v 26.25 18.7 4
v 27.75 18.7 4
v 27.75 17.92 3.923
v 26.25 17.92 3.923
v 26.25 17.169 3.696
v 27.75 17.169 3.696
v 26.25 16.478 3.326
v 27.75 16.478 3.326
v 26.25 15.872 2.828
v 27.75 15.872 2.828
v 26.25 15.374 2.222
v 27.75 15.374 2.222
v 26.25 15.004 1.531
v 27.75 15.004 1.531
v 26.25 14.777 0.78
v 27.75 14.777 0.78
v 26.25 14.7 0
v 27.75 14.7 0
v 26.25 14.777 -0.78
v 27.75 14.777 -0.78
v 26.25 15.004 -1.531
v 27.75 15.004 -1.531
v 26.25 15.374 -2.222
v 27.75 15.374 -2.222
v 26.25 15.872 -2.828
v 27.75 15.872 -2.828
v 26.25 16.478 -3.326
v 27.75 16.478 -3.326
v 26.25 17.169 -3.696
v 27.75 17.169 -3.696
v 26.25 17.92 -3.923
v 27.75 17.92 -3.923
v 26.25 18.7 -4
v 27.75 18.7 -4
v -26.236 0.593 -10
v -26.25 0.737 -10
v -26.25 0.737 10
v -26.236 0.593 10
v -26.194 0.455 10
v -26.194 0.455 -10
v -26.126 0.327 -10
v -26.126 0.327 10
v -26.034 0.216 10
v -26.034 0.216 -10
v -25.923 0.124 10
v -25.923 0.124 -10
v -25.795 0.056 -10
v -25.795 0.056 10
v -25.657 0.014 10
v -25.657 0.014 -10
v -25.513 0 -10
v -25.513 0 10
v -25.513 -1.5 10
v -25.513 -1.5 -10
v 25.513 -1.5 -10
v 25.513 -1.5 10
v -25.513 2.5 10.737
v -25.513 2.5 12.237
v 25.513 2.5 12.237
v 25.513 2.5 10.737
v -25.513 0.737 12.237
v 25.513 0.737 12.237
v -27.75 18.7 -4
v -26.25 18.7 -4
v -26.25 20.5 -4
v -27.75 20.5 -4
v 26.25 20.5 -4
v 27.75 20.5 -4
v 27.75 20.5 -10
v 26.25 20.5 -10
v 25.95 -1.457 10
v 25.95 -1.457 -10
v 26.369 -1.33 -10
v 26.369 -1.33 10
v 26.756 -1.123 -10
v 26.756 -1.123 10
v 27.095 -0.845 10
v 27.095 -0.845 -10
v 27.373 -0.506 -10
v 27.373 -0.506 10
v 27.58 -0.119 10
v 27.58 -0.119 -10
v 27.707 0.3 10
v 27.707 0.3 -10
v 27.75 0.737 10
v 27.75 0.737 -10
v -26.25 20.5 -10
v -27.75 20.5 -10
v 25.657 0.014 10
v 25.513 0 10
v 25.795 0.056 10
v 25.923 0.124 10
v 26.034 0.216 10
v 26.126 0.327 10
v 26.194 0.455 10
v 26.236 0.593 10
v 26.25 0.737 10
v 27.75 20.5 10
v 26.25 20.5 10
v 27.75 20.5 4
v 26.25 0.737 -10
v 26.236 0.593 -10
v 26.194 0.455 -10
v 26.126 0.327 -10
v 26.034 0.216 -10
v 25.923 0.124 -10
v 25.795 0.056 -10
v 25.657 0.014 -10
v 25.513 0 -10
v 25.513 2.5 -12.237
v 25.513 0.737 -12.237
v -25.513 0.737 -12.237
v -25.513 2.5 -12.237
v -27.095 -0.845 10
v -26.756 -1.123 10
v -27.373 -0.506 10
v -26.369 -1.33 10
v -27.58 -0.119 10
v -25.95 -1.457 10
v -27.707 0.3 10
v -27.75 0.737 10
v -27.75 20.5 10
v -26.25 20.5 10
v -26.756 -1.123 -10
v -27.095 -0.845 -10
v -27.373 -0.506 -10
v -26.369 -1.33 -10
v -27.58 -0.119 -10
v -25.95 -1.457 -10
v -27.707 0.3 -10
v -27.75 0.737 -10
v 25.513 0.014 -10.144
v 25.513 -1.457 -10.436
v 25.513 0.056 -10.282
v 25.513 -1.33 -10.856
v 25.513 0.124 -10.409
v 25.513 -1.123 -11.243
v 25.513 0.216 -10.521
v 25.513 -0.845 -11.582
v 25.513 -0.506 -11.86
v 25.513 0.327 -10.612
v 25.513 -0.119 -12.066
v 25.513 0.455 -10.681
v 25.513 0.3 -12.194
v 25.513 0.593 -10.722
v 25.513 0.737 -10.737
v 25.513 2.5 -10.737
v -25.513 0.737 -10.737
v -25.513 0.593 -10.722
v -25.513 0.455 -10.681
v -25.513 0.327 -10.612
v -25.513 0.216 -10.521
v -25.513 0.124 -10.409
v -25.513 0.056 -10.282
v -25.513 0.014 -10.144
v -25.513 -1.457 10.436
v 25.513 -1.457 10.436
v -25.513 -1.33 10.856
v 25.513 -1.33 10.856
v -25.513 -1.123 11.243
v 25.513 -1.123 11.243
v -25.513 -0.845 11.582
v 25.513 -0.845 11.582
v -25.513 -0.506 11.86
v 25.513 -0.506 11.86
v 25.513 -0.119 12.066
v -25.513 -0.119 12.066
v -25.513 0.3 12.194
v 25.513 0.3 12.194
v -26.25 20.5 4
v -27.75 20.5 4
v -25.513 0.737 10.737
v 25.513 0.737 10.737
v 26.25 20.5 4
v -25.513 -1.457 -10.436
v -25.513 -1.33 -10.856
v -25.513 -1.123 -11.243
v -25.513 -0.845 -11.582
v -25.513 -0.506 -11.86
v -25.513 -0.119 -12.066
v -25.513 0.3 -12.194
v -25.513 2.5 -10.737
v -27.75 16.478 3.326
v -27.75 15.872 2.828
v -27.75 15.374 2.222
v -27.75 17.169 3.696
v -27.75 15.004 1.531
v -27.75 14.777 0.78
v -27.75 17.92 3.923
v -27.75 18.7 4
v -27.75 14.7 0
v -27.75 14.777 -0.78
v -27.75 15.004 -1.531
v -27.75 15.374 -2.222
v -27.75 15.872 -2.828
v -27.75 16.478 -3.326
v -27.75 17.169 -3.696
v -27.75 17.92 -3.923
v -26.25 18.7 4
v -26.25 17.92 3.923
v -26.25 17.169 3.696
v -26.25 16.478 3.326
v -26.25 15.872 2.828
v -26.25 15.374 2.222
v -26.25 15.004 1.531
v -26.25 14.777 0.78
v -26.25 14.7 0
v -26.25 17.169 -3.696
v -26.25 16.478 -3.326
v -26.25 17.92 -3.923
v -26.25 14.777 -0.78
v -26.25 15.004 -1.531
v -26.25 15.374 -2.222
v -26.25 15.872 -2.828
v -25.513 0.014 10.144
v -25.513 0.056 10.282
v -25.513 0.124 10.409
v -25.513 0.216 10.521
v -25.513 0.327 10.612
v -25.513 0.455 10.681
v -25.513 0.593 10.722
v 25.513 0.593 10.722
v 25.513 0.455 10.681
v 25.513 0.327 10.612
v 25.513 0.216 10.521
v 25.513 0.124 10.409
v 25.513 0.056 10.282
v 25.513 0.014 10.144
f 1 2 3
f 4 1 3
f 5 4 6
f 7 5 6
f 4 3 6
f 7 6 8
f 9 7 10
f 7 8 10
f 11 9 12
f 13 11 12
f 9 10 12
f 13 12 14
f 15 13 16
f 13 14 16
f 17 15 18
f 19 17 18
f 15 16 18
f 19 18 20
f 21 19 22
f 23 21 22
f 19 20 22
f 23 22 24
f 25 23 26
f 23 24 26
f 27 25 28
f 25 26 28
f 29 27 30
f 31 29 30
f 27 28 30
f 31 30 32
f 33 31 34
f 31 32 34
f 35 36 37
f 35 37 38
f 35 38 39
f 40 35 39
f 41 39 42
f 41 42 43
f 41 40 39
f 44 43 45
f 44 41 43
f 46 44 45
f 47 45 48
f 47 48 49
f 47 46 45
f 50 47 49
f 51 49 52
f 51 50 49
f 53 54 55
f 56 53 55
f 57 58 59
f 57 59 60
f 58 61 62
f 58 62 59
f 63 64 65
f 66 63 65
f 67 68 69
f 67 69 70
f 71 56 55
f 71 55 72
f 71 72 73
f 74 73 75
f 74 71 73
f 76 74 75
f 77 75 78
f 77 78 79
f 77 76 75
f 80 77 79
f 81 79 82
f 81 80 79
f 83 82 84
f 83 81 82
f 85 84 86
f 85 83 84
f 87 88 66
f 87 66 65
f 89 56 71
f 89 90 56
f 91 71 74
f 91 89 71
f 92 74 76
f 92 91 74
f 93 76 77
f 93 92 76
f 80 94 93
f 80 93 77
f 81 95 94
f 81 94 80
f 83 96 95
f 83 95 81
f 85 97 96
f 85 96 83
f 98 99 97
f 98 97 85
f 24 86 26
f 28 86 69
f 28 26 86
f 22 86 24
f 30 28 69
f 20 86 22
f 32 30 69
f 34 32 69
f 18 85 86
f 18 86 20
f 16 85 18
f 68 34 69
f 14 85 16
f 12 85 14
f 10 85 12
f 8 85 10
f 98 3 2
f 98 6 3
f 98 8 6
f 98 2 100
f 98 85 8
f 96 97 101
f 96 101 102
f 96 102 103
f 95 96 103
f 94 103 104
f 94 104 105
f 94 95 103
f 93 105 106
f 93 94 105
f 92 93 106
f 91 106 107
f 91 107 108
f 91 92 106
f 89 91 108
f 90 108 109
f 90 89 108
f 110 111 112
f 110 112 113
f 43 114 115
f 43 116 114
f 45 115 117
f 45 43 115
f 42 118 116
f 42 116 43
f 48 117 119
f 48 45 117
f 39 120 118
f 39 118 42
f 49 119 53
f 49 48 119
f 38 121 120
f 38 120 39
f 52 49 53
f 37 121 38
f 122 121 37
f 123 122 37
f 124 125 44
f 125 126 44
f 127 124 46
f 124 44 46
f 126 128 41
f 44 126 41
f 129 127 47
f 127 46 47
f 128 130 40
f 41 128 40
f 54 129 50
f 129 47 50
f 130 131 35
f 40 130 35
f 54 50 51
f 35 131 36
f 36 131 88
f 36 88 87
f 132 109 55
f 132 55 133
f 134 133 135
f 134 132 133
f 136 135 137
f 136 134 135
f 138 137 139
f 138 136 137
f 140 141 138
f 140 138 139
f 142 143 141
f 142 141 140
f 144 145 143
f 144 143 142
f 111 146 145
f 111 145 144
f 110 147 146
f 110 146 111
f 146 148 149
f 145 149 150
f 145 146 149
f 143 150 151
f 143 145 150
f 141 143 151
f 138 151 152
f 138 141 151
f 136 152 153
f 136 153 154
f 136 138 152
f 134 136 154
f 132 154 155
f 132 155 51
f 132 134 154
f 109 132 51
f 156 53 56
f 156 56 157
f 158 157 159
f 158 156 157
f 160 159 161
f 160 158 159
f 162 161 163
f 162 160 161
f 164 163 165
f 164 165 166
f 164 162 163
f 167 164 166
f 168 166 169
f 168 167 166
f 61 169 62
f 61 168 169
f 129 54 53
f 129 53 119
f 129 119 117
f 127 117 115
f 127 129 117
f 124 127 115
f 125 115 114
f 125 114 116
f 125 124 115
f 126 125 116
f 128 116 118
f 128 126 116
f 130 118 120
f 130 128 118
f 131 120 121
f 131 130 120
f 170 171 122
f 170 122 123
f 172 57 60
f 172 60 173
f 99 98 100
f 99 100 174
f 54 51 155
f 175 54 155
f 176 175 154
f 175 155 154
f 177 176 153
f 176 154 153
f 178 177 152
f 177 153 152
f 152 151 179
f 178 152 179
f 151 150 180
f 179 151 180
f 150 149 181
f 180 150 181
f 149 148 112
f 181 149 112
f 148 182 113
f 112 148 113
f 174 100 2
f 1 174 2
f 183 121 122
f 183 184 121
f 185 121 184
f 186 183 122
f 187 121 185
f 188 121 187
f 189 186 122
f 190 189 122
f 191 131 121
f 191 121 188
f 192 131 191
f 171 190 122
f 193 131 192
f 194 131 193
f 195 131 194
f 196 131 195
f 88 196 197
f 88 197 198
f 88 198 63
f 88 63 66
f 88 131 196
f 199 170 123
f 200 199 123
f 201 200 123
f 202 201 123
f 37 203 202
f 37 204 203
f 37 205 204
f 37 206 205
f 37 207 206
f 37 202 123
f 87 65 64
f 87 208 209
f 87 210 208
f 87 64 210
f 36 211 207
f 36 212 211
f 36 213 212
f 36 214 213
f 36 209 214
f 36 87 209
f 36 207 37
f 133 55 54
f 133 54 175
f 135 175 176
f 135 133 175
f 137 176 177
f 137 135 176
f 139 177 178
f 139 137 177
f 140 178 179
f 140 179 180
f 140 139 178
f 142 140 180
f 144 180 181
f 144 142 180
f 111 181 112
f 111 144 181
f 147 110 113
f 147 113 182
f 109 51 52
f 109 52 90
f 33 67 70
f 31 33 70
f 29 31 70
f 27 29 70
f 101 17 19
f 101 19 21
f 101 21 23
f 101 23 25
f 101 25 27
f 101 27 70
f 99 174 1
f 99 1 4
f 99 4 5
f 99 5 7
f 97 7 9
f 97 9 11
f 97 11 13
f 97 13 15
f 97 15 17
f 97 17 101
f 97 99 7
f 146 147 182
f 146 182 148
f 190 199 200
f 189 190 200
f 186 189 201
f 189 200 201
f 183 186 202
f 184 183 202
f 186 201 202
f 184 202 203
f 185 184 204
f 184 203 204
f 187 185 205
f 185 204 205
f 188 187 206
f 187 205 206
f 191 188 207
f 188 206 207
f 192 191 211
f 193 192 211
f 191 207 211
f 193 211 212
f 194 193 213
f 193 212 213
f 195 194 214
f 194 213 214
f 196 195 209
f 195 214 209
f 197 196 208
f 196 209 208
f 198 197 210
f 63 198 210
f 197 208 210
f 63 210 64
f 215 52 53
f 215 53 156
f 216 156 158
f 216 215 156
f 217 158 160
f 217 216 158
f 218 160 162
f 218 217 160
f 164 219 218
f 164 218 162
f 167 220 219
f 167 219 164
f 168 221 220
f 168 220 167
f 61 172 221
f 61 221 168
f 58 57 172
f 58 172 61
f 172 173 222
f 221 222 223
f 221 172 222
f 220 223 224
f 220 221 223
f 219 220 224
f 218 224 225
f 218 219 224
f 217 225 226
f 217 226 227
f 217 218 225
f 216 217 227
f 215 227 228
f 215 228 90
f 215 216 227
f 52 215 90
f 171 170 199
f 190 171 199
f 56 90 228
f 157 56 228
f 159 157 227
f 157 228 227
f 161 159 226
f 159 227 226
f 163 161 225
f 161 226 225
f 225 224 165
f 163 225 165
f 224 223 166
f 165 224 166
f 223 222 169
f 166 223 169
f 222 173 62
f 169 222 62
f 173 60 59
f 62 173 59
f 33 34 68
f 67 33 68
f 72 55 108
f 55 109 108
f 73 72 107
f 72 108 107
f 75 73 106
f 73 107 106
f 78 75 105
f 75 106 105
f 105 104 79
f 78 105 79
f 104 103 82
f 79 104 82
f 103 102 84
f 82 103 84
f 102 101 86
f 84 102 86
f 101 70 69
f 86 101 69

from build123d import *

# Parameters (mm, degrees)
CROQUIS3_W                         = 55.5
CROQUIS3_H                         = 20
BRIDA_BASE1_DEPTH                  = 1.5
BRIDA_DE_ARISTA1_STRIP_W           = 7.4732
BRIDA_DE_ARISTA1_STRIP_H           = 1.5
BRIDA_DE_ARISTA1_STRIP_CUT_DEPTH   = 20
BRIDA_DE_ARISTA1_STRIP_2_W         = 7.4732
BRIDA_DE_ARISTA1_STRIP_2_H         = 1.5
BRIDA_DE_ARISTA1_STRIP_CUT_2_DEPTH = 20
BRIDA_DE_ARISTA1_DEPTH             = 20
BRIDA_DE_ARISTA1_BEND_DEPTH        = 20
BRIDA_DE_ARISTA2_DEPTH             = 51.0268
BRIDA_DE_ARISTA2_BEND_DEPTH        = 51.0268
CORTAR_EXTRUIR1_REACH              = 62.417


# Sheet-metal steps are written as plain solids
with BuildPart() as part:
    # Croquis3 → Brida base1 (new body)
    with BuildSketch(Plane(origin=(0, 0, 0), x_dir=(1, 0, 0), z_dir=(0, 1, 0))):
        Rectangle(CROQUIS3_W, CROQUIS3_H)
    extrude(amount=-BRIDA_BASE1_DEPTH)

    # Brida de arista1 strip (across the edge) → Brida de arista1 strip cut (cut)
    with BuildSketch(Plane(origin=(-27.75, 0, -10), x_dir=(1, 0, 0), z_dir=(0, 0, 1))):
        with Locations((-1.5, -0.75)):
            Rectangle(BRIDA_DE_ARISTA1_STRIP_W, BRIDA_DE_ARISTA1_STRIP_H)
    extrude(amount=BRIDA_DE_ARISTA1_STRIP_CUT_DEPTH, mode=Mode.SUBTRACT)

    # Brida de arista1 strip 2 (across the edge) → Brida de arista1 strip cut 2 (cut)
    with BuildSketch(Plane(origin=(27.75, 0, 10), x_dir=(-1, 0, 0), z_dir=(0, 0, -1))):
        with Locations((-1.5, -0.75)):
            Rectangle(BRIDA_DE_ARISTA1_STRIP_2_W, BRIDA_DE_ARISTA1_STRIP_2_H)
    extrude(amount=BRIDA_DE_ARISTA1_STRIP_CUT_2_DEPTH, mode=Mode.SUBTRACT)

    # Brida de arista1 section (across the edge) → Brida de arista1 (add)
    with BuildSketch(Plane(origin=(-27.75, 0, -10), x_dir=(1, 0, 0), z_dir=(0, 0, 1))):
        with BuildLine():
            Line((0, 0.7366), (0, 20.5))
            Line((0, 20.5), (1.5, 20.5))
            Line((1.5, 20.5), (1.5, 0.7366))
            ThreePointArc((1.5, 0.7366), (1.715745145, 0.215745145), (2.2366, 0))
            Line((2.2366, 0), (2.2366, -1.5))
            ThreePointArc((2.2366, -1.5), (0.655084973, -0.844915027), (0, 0.7366))
        make_face()
    extrude(amount=BRIDA_DE_ARISTA1_DEPTH)

    # Brida de arista1 section 2 (across the edge) → Brida de arista1 bend (add)
    with BuildSketch(Plane(origin=(27.75, 0, 10), x_dir=(-1, 0, 0), z_dir=(0, 0, -1))):
        with BuildLine():
            Line((0, 0.7366), (0, 20.5))
            Line((0, 20.5), (1.5, 20.5))
            Line((1.5, 20.5), (1.5, 0.7366))
            ThreePointArc((1.5, 0.7366), (1.715745145, 0.215745145), (2.2366, 0))
            Line((2.2366, 0), (2.2366, -1.5))
            ThreePointArc((2.2366, -1.5), (0.655084973, -0.844915027), (0, 0.7366))
        make_face()
    extrude(amount=BRIDA_DE_ARISTA1_BEND_DEPTH)

    # Brida de arista2 section (across the edge) → Brida de arista2 (add)
    with BuildSketch(Plane(origin=(-25.5134, 0, 10.7366), x_dir=(0, 0, -1), z_dir=(1, 0, 0))):
        with BuildLine():
            Line((-1.5, 0.7366), (-1.5, 2.5))
            Line((-1.5, 2.5), (0, 2.5))
            Line((0, 2.5), (0, 0.7366))
            ThreePointArc((0, 0.7366), (0.215745145, 0.215745145), (0.7366, 0))
            Line((0.7366, 0), (0.7366, -1.5))
            ThreePointArc((0.7366, -1.5), (-0.844915027, -0.844915027), (-1.5, 0.7366))
        make_face()
    extrude(amount=BRIDA_DE_ARISTA2_DEPTH)

    # Brida de arista2 section 2 (across the edge) → Brida de arista2 bend (add)
    with BuildSketch(Plane(origin=(25.5134, 0, -10.7366), x_dir=(0, 0, 1), z_dir=(-1, 0, 0))):
        with BuildLine():
            Line((-1.5, 0.7366), (-1.5, 2.5))
            Line((-1.5, 2.5), (0, 2.5))
            Line((0, 2.5), (0, 0.7366))
            ThreePointArc((0, 0.7366), (0.215745145, 0.215745145), (0.7366, 0))
            Line((0.7366, 0), (0.7366, -1.5))
            ThreePointArc((0.7366, -1.5), (-0.844915027, -0.844915027), (-1.5, 0.7366))
        make_face()
    extrude(amount=BRIDA_DE_ARISTA2_BEND_DEPTH)

    # Cortar-Extruir1: up to this face of the body (flat: up to its plane)
    cortar_extruir1_end = Plane(part.part.faces().sort_by_distance((-27.75, 10.6183, 0))[0])
    # Croquis20 → Cortar-Extruir1 (cut, up to the picked face)
    with BuildSketch(Plane(origin=(27.75, 0, 0), x_dir=(0, 0, -1), z_dir=(1, 0, 0)), mode=Mode.PRIVATE) as cortar_extruir1_sk1:
        with BuildLine():
            Line((4, 18.7), (4, 22.7))
            Line((4, 22.7), (-4, 22.7))
            Line((-4, 22.7), (-4, 18.7))
            ThreePointArc((-4, 18.7), (0, 14.7), (4, 18.7))
        make_face()
    cortar_extruir1_tool1 = split(extrude(cortar_extruir1_sk1.sketch, amount=-CORTAR_EXTRUIR1_REACH, mode=Mode.PRIVATE), bisect_by=cortar_extruir1_end, keep=Keep.BOTH, mode=Mode.PRIVATE)
    add(cortar_extruir1_tool1.solids().sort_by(Axis((27.75, 19.073399, 0), (-1, 0, 0)))[0], mode=Mode.SUBTRACT)


solid = part.part
